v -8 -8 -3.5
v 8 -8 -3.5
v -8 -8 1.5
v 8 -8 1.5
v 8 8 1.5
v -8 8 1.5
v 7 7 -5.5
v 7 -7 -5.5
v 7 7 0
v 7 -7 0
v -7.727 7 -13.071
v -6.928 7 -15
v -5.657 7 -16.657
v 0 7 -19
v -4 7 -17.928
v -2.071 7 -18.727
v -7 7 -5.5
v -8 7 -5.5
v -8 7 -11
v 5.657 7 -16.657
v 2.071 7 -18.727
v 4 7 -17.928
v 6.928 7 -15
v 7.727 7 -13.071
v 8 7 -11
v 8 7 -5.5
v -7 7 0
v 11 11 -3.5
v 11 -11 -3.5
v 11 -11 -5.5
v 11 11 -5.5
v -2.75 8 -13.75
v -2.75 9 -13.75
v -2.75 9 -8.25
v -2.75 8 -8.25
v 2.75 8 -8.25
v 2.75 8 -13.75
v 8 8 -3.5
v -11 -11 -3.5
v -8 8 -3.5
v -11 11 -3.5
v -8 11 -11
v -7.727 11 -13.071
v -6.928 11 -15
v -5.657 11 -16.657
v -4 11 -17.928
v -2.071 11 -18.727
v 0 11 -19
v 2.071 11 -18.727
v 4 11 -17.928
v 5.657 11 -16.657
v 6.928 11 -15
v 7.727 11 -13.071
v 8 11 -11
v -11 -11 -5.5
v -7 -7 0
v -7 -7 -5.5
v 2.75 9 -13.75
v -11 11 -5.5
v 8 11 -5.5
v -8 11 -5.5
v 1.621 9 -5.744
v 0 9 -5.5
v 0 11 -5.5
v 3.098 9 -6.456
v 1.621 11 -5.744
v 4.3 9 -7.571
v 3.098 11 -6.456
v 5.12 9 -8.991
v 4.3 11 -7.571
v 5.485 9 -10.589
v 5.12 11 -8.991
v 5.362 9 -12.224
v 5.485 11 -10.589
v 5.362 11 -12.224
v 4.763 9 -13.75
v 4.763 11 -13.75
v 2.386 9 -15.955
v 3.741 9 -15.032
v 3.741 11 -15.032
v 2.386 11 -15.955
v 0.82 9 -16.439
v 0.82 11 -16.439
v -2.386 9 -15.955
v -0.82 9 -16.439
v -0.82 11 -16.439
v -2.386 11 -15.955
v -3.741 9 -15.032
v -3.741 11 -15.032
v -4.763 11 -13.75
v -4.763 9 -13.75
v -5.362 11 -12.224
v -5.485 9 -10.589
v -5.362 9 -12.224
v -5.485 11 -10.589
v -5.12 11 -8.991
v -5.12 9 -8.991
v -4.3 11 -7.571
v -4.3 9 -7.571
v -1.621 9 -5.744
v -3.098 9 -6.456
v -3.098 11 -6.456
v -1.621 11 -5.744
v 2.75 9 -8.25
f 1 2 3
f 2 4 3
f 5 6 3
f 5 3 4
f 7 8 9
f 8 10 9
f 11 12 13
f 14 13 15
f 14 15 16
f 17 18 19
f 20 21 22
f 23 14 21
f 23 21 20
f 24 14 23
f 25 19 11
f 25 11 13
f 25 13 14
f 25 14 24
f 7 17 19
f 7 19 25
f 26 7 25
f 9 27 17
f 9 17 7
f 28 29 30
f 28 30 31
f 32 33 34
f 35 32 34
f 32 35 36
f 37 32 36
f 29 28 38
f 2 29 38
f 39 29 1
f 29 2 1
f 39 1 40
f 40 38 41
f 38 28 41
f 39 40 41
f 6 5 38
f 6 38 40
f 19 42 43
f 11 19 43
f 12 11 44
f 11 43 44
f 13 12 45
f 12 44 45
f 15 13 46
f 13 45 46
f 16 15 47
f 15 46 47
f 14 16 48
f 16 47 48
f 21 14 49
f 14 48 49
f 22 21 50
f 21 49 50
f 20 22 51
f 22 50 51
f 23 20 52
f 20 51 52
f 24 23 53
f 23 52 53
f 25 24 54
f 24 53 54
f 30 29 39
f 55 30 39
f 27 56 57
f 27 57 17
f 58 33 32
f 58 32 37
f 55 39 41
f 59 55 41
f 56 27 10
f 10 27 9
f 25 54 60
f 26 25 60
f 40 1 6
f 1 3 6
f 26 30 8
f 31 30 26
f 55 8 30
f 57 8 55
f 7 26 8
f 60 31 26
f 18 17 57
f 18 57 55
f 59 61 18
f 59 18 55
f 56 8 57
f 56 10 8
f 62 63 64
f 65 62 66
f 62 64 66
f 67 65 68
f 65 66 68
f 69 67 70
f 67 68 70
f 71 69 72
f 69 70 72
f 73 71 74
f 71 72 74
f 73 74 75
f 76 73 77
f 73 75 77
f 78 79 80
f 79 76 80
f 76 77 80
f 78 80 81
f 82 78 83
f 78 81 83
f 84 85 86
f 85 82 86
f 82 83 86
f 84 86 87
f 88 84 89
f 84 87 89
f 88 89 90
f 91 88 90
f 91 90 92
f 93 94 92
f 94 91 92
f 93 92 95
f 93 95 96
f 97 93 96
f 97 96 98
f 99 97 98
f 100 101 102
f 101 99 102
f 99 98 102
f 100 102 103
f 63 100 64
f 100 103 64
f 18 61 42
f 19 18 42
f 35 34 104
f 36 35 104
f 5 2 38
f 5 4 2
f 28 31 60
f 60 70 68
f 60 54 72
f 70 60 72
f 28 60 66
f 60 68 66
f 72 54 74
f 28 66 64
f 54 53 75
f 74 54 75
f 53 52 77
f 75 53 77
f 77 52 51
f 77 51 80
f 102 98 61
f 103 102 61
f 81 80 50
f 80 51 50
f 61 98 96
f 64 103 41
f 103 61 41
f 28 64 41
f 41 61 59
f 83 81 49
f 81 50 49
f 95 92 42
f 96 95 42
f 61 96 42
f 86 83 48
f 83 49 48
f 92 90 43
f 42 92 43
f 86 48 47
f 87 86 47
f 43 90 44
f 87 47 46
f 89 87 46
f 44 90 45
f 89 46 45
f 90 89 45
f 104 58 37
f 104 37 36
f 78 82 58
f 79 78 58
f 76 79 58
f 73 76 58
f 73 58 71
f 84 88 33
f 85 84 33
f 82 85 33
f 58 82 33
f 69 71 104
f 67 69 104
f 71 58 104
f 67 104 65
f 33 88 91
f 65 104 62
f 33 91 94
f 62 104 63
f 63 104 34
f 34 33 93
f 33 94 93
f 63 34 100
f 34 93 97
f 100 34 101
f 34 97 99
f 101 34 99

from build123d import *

# Parameters (mm, degrees)
SKETCH1_W             = 16
SKETCH1_H             = 16
FRONT_OF_SWITCH_DEPTH = 1.5
SKETCH2_W             = 16
SKETCH2_H             = 16
SKETCH2_W_2           = 14
SKETCH2_H_2           = 14
SIDES_OF_SWITCH_DEPTH = 3.5
SKETCH3_W             = 22
SKETCH3_H             = 22
SKETCH3_W_2           = 14
SKETCH3_H_2           = 14
BOSS_EXTRUDE3_DEPTH   = 2
SKETCH4_R             = 5.5
BOSS_EXTRUDE4_DEPTH   = 4
BOSS_EXTRUDE5_START   = -2
SKETCH5_R             = 5.5
SKETCH5_W             = 5.5
SKETCH5_H             = 5.5
BOSS_EXTRUDE5_DEPTH   = 2
SKETCH6_W             = 5.5
SKETCH6_H             = 5.5
BOSS_EXTRUDE6_DEPTH   = 1


with BuildPart() as part:
    # Sketch1 → Front of switch (new body)
    with BuildSketch(Plane.XY):
        Rectangle(SKETCH1_W, SKETCH1_H)
    extrude(amount=FRONT_OF_SWITCH_DEPTH)

    # Sketch2 → Sides of switch (add)
    with BuildSketch(Plane(origin=(0, 0, 0), x_dir=(-1, 0, 0), z_dir=(0, 0, -1))):
        Rectangle(SKETCH2_W, SKETCH2_H)
        Rectangle(SKETCH2_W_2, SKETCH2_H_2, mode=Mode.SUBTRACT)
    extrude(amount=SIDES_OF_SWITCH_DEPTH)

    # Sketch3 → Boss-Extrude3 (add)
    with BuildSketch(Plane(origin=(0, 0, -3.5), x_dir=(-1, 0, 0), z_dir=(0, 0, -1))):
        Rectangle(SKETCH3_W, SKETCH3_H)
        Rectangle(SKETCH3_W_2, SKETCH3_H_2, mode=Mode.SUBTRACT)
    extrude(amount=BOSS_EXTRUDE3_DEPTH)

    # Sketch4 → Boss-Extrude4 (add)
    with BuildSketch(Plane(origin=(0, 11, 0), x_dir=(1, 0, 0), z_dir=(0, 1, 0))):
        with BuildLine():
            Line((-8, 5.5), (-8, 11))
            ThreePointArc((-8, 11), (0, 19), (8, 11))
            Line((8, 11), (8, 5.5))
            Line((8, 5.5), (8, 3.5))
            Line((8, 3.5), (-8, 3.5))
            Line((-8, 3.5), (-8, 5.5))
        make_face()
        with Locations(Location((0, 11, 0), (0, 0, 270))):
            Circle(SKETCH4_R, mode=Mode.SUBTRACT)
    extrude(amount=-BOSS_EXTRUDE4_DEPTH)

    # Sketch5 → Boss-Extrude5 (add)
    with BuildSketch(Plane.XZ.offset(-7).offset(BOSS_EXTRUDE5_START)):
        with Locations(Location((0, -11, 0), (0, 0, 90))):
            Circle(SKETCH5_R)
        with Locations((0, -11)):
            Rectangle(SKETCH5_W, SKETCH5_H, mode=Mode.SUBTRACT)
    extrude(amount=BOSS_EXTRUDE5_DEPTH)

    # Sketch6 → Boss-Extrude6 (add)
    with BuildSketch(Plane.XZ.offset(-7)):
        with Locations((0, -11)):
            Rectangle(SKETCH6_W, SKETCH6_H)
    extrude(amount=-BOSS_EXTRUDE6_DEPTH)


solid = part.part
